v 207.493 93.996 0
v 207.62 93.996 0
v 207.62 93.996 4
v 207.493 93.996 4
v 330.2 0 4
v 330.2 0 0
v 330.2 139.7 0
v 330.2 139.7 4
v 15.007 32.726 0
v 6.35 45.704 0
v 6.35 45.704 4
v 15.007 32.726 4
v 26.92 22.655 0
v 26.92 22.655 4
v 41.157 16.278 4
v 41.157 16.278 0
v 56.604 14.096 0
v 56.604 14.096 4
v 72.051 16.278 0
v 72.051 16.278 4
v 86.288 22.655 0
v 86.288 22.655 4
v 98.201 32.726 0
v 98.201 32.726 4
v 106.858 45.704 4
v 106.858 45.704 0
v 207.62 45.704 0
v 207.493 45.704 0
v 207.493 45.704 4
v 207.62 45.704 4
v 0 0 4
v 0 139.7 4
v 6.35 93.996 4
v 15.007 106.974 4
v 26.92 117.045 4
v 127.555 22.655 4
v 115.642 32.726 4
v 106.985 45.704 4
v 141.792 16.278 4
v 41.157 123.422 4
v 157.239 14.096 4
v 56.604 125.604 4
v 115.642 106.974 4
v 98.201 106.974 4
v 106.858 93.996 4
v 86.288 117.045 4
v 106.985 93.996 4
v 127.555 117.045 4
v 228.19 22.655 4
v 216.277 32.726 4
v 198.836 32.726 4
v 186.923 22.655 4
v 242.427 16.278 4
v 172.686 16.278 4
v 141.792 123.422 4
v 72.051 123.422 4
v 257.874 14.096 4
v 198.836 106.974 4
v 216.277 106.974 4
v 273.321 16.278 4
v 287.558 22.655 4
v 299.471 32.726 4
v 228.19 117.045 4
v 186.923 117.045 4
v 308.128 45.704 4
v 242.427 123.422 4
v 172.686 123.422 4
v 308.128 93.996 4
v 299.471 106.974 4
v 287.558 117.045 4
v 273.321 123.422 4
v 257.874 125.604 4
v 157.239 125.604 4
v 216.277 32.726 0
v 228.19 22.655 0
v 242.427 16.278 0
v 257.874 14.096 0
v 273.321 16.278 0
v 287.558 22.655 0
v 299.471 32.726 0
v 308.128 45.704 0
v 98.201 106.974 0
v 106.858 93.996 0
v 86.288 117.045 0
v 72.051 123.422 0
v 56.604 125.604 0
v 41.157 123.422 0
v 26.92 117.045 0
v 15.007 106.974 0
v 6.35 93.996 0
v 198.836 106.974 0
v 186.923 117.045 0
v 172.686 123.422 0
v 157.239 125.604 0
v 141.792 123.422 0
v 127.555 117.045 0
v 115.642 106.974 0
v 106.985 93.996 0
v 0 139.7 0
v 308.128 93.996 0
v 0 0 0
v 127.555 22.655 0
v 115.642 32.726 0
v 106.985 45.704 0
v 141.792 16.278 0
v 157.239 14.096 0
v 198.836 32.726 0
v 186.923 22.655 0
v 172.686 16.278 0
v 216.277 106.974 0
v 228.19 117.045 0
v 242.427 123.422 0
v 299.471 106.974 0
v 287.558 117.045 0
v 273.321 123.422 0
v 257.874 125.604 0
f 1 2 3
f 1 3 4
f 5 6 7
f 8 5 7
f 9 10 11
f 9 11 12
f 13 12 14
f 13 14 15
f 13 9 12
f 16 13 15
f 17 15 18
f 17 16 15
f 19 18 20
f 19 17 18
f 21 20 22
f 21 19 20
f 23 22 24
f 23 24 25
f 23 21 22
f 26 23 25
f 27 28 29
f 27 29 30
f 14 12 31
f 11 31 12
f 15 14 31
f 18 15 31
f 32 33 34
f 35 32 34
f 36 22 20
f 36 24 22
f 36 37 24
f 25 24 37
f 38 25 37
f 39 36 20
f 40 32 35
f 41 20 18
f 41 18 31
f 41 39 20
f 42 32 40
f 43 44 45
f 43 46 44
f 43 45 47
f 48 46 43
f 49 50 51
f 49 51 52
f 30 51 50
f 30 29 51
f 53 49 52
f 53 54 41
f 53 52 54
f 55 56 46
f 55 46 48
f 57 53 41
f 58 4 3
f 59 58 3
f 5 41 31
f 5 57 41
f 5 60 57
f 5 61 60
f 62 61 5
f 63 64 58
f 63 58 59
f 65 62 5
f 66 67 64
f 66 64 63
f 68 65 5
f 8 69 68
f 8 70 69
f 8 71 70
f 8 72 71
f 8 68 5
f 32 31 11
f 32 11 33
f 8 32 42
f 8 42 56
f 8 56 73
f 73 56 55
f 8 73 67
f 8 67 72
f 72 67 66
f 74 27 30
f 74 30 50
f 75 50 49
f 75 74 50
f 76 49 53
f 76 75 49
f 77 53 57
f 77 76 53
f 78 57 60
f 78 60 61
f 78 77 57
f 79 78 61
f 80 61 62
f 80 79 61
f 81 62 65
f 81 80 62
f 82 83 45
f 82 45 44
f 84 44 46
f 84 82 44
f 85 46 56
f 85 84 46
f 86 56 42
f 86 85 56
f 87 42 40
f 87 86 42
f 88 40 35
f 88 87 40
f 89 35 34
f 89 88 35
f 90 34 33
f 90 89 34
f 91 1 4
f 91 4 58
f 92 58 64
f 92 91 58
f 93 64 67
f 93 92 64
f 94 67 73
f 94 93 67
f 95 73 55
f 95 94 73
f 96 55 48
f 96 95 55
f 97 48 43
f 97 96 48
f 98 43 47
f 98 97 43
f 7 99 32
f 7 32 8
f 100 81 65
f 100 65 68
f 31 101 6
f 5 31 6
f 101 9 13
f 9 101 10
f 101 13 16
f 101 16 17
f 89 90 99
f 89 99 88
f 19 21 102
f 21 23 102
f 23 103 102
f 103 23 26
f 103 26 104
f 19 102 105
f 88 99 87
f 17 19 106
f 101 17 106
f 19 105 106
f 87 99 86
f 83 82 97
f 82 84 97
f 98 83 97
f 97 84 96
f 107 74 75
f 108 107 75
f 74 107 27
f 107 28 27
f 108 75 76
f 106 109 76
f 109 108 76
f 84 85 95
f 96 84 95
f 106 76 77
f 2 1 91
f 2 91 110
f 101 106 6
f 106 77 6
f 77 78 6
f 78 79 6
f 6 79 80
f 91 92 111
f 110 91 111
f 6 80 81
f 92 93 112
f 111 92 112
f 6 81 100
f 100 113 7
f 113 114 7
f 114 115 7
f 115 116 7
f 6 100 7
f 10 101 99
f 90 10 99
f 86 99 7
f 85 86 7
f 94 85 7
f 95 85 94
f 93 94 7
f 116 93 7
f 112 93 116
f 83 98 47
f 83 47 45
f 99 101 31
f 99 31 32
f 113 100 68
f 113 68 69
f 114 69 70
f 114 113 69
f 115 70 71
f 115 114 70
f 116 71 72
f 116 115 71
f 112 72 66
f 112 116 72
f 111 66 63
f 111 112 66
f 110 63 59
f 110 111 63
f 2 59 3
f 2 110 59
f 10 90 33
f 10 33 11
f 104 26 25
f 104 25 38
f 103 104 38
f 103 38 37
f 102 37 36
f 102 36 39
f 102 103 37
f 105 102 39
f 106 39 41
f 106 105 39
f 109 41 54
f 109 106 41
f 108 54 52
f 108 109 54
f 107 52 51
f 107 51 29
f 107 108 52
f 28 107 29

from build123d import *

# Parameters (mm, degrees)
SKETCH4_W           = 330.2
SKETCH4_H           = 139.7
BOSS_EXTRUDE3_DEPTH = 4


with BuildPart() as part:
    # Sketch4 → Boss-Extrude3 (new body)
    with BuildSketch(Plane.XY):
        with Locations((165.1, 69.85)):
            Rectangle(SKETCH4_W, SKETCH4_H)
        with BuildLine():
            Line((6.35, 93.996304065), (6.35, 45.703695935))
            ThreePointArc((6.35, 45.703695935), (56.604, 14.096), (106.858, 45.703695935))
            Line((106.858, 45.703695935), (106.985, 45.703695935))
            ThreePointArc((106.985, 45.703695935), (157.239, 14.096), (207.493, 45.703695935))
            Line((207.493, 45.703695935), (207.62, 45.703695935))
            ThreePointArc((207.62, 45.703695935), (257.874, 14.096), (308.128, 45.703695935))
            Line((308.128, 45.703695935), (308.128, 93.996304065))
            ThreePointArc((308.128, 93.996304065), (257.874, 125.604), (207.62, 93.996304065))
            Line((207.62, 93.996304065), (207.493, 93.996304065))
            ThreePointArc((207.493, 93.996304065), (157.239, 125.604), (106.985, 93.996304065))
            Line((106.985, 93.996304065), (106.858, 93.996304065))
            ThreePointArc((106.858, 93.996304065), (56.604, 125.604), (6.35, 93.996304065))
        make_face(mode=Mode.SUBTRACT)
    extrude(amount=BOSS_EXTRUDE3_DEPTH)


solid = part.part
